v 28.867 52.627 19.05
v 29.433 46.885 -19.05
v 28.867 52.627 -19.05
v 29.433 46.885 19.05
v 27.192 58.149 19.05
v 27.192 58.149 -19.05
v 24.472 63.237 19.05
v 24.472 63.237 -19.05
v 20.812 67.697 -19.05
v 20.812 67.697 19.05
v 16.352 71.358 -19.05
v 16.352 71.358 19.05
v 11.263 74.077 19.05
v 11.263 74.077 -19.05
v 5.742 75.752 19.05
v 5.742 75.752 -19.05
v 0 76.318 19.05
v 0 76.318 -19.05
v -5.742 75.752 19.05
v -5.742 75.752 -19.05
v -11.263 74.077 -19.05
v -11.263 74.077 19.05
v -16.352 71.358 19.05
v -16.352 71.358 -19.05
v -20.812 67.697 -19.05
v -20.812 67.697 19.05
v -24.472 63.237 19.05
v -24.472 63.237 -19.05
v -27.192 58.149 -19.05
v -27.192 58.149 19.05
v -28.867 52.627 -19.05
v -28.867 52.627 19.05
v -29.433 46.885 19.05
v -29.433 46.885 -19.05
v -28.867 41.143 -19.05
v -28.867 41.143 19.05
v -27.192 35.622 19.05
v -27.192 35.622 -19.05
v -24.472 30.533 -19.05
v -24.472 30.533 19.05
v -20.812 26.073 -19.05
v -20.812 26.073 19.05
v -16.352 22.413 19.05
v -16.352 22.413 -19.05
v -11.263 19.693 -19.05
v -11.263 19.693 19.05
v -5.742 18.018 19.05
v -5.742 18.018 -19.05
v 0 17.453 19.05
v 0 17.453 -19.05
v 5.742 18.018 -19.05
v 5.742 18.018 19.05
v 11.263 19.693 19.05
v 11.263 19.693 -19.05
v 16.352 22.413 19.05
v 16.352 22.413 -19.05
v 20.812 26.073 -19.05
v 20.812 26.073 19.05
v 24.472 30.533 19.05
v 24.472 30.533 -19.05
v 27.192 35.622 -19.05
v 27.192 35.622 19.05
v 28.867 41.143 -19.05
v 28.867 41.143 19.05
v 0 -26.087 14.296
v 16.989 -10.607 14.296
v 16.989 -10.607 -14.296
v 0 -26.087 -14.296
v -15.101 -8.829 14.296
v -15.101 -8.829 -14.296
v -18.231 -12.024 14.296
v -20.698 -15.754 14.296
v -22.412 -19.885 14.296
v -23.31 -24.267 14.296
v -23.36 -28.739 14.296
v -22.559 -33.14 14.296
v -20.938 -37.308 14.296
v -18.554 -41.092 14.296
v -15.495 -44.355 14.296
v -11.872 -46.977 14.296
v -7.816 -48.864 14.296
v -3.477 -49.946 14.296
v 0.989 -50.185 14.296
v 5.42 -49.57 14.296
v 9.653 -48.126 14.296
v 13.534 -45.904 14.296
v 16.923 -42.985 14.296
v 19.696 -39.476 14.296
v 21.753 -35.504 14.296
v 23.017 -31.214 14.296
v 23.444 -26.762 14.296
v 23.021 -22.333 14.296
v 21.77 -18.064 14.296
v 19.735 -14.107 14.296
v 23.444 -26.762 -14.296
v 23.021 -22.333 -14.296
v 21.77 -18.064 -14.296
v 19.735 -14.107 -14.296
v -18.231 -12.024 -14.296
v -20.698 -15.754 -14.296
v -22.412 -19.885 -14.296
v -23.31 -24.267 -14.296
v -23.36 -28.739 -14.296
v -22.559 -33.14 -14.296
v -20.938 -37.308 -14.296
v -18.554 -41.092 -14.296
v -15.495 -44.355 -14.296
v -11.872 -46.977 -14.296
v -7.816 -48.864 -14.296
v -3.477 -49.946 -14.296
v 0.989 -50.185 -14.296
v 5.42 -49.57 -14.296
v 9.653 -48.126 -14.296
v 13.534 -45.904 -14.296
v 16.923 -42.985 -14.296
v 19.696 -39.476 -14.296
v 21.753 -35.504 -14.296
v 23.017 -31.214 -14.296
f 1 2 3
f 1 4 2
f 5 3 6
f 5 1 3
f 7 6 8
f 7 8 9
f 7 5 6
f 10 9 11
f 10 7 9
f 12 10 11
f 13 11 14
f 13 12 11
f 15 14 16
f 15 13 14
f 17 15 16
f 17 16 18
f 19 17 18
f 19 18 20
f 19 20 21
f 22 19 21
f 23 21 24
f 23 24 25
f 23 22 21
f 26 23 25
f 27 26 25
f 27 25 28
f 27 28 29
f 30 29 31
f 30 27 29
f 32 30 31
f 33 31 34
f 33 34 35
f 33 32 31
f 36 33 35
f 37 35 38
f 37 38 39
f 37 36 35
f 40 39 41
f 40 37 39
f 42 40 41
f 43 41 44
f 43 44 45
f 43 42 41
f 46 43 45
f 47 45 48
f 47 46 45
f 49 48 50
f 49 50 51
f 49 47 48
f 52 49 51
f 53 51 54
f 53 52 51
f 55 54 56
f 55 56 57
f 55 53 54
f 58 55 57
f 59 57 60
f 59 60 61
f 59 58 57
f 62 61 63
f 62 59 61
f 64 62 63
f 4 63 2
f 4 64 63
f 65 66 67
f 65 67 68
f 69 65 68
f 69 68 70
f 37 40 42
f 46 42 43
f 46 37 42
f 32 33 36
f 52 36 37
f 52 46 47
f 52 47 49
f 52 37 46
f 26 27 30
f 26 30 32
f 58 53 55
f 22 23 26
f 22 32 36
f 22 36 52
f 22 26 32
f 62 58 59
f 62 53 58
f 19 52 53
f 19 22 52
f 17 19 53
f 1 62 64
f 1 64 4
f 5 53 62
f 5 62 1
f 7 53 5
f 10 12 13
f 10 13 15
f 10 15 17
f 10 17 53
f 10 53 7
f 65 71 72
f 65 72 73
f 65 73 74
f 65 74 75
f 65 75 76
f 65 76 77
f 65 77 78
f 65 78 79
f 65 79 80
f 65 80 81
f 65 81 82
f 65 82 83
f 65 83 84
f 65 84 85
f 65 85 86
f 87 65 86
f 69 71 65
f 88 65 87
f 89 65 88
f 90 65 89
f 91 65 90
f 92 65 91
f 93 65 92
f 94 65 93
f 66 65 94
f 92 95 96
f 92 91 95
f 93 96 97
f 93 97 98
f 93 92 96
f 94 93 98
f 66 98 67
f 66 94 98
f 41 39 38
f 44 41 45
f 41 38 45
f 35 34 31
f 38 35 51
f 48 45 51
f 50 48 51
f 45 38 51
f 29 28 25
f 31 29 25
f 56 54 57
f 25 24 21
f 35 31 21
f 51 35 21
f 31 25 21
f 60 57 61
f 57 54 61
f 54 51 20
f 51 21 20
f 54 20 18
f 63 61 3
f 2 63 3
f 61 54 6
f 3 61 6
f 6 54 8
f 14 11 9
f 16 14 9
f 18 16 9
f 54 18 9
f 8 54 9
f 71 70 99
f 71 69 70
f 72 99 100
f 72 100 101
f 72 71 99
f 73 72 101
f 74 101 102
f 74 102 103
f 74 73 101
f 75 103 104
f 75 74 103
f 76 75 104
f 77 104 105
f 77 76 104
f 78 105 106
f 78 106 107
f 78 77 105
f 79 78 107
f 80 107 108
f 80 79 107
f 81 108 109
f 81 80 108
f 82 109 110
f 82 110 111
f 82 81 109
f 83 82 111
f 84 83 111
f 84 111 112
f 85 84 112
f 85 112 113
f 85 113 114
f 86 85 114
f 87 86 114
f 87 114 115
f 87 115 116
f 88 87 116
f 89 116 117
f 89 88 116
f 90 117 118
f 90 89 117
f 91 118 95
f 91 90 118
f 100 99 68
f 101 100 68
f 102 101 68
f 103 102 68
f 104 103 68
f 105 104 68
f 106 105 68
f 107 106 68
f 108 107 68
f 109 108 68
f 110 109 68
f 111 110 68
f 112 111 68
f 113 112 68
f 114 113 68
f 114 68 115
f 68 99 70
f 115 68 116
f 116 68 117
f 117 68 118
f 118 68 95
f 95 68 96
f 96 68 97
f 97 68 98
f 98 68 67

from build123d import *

# Parameters (mm, degrees)
F2_DEPTH = 14.296287
F0_R     = 29.432581
F3_DEPTH = 19.05


with BuildPart() as f2:
    # F1 (on face) → F2 (new body, symmetric)
    with BuildSketch(Plane.XY):
        with BuildLine():
            ThreePointArc((23.443553, -26.761964), (21.770109, -18.063544), (16.988686, -10.606943))
            Line((16.988686, -10.606943), (0, -26.087388))
            Line((0, -26.087388), (-15.10051, -8.829458))
            ThreePointArc((-15.10051, -8.829458), (-9.88915, -48.017666), (23.443553, -26.761964))
        make_face()
    extrude(amount=F2_DEPTH, both=True)


with BuildPart() as f3:
    # F0 (on Top) → F3 (new body, symmetric)
    with BuildSketch(Plane.XY):
        with Locations((0, 46.885327)):
            Circle(F0_R)
    extrude(amount=F3_DEPTH, both=True)


solid = Compound([f2.part, f3.part])
